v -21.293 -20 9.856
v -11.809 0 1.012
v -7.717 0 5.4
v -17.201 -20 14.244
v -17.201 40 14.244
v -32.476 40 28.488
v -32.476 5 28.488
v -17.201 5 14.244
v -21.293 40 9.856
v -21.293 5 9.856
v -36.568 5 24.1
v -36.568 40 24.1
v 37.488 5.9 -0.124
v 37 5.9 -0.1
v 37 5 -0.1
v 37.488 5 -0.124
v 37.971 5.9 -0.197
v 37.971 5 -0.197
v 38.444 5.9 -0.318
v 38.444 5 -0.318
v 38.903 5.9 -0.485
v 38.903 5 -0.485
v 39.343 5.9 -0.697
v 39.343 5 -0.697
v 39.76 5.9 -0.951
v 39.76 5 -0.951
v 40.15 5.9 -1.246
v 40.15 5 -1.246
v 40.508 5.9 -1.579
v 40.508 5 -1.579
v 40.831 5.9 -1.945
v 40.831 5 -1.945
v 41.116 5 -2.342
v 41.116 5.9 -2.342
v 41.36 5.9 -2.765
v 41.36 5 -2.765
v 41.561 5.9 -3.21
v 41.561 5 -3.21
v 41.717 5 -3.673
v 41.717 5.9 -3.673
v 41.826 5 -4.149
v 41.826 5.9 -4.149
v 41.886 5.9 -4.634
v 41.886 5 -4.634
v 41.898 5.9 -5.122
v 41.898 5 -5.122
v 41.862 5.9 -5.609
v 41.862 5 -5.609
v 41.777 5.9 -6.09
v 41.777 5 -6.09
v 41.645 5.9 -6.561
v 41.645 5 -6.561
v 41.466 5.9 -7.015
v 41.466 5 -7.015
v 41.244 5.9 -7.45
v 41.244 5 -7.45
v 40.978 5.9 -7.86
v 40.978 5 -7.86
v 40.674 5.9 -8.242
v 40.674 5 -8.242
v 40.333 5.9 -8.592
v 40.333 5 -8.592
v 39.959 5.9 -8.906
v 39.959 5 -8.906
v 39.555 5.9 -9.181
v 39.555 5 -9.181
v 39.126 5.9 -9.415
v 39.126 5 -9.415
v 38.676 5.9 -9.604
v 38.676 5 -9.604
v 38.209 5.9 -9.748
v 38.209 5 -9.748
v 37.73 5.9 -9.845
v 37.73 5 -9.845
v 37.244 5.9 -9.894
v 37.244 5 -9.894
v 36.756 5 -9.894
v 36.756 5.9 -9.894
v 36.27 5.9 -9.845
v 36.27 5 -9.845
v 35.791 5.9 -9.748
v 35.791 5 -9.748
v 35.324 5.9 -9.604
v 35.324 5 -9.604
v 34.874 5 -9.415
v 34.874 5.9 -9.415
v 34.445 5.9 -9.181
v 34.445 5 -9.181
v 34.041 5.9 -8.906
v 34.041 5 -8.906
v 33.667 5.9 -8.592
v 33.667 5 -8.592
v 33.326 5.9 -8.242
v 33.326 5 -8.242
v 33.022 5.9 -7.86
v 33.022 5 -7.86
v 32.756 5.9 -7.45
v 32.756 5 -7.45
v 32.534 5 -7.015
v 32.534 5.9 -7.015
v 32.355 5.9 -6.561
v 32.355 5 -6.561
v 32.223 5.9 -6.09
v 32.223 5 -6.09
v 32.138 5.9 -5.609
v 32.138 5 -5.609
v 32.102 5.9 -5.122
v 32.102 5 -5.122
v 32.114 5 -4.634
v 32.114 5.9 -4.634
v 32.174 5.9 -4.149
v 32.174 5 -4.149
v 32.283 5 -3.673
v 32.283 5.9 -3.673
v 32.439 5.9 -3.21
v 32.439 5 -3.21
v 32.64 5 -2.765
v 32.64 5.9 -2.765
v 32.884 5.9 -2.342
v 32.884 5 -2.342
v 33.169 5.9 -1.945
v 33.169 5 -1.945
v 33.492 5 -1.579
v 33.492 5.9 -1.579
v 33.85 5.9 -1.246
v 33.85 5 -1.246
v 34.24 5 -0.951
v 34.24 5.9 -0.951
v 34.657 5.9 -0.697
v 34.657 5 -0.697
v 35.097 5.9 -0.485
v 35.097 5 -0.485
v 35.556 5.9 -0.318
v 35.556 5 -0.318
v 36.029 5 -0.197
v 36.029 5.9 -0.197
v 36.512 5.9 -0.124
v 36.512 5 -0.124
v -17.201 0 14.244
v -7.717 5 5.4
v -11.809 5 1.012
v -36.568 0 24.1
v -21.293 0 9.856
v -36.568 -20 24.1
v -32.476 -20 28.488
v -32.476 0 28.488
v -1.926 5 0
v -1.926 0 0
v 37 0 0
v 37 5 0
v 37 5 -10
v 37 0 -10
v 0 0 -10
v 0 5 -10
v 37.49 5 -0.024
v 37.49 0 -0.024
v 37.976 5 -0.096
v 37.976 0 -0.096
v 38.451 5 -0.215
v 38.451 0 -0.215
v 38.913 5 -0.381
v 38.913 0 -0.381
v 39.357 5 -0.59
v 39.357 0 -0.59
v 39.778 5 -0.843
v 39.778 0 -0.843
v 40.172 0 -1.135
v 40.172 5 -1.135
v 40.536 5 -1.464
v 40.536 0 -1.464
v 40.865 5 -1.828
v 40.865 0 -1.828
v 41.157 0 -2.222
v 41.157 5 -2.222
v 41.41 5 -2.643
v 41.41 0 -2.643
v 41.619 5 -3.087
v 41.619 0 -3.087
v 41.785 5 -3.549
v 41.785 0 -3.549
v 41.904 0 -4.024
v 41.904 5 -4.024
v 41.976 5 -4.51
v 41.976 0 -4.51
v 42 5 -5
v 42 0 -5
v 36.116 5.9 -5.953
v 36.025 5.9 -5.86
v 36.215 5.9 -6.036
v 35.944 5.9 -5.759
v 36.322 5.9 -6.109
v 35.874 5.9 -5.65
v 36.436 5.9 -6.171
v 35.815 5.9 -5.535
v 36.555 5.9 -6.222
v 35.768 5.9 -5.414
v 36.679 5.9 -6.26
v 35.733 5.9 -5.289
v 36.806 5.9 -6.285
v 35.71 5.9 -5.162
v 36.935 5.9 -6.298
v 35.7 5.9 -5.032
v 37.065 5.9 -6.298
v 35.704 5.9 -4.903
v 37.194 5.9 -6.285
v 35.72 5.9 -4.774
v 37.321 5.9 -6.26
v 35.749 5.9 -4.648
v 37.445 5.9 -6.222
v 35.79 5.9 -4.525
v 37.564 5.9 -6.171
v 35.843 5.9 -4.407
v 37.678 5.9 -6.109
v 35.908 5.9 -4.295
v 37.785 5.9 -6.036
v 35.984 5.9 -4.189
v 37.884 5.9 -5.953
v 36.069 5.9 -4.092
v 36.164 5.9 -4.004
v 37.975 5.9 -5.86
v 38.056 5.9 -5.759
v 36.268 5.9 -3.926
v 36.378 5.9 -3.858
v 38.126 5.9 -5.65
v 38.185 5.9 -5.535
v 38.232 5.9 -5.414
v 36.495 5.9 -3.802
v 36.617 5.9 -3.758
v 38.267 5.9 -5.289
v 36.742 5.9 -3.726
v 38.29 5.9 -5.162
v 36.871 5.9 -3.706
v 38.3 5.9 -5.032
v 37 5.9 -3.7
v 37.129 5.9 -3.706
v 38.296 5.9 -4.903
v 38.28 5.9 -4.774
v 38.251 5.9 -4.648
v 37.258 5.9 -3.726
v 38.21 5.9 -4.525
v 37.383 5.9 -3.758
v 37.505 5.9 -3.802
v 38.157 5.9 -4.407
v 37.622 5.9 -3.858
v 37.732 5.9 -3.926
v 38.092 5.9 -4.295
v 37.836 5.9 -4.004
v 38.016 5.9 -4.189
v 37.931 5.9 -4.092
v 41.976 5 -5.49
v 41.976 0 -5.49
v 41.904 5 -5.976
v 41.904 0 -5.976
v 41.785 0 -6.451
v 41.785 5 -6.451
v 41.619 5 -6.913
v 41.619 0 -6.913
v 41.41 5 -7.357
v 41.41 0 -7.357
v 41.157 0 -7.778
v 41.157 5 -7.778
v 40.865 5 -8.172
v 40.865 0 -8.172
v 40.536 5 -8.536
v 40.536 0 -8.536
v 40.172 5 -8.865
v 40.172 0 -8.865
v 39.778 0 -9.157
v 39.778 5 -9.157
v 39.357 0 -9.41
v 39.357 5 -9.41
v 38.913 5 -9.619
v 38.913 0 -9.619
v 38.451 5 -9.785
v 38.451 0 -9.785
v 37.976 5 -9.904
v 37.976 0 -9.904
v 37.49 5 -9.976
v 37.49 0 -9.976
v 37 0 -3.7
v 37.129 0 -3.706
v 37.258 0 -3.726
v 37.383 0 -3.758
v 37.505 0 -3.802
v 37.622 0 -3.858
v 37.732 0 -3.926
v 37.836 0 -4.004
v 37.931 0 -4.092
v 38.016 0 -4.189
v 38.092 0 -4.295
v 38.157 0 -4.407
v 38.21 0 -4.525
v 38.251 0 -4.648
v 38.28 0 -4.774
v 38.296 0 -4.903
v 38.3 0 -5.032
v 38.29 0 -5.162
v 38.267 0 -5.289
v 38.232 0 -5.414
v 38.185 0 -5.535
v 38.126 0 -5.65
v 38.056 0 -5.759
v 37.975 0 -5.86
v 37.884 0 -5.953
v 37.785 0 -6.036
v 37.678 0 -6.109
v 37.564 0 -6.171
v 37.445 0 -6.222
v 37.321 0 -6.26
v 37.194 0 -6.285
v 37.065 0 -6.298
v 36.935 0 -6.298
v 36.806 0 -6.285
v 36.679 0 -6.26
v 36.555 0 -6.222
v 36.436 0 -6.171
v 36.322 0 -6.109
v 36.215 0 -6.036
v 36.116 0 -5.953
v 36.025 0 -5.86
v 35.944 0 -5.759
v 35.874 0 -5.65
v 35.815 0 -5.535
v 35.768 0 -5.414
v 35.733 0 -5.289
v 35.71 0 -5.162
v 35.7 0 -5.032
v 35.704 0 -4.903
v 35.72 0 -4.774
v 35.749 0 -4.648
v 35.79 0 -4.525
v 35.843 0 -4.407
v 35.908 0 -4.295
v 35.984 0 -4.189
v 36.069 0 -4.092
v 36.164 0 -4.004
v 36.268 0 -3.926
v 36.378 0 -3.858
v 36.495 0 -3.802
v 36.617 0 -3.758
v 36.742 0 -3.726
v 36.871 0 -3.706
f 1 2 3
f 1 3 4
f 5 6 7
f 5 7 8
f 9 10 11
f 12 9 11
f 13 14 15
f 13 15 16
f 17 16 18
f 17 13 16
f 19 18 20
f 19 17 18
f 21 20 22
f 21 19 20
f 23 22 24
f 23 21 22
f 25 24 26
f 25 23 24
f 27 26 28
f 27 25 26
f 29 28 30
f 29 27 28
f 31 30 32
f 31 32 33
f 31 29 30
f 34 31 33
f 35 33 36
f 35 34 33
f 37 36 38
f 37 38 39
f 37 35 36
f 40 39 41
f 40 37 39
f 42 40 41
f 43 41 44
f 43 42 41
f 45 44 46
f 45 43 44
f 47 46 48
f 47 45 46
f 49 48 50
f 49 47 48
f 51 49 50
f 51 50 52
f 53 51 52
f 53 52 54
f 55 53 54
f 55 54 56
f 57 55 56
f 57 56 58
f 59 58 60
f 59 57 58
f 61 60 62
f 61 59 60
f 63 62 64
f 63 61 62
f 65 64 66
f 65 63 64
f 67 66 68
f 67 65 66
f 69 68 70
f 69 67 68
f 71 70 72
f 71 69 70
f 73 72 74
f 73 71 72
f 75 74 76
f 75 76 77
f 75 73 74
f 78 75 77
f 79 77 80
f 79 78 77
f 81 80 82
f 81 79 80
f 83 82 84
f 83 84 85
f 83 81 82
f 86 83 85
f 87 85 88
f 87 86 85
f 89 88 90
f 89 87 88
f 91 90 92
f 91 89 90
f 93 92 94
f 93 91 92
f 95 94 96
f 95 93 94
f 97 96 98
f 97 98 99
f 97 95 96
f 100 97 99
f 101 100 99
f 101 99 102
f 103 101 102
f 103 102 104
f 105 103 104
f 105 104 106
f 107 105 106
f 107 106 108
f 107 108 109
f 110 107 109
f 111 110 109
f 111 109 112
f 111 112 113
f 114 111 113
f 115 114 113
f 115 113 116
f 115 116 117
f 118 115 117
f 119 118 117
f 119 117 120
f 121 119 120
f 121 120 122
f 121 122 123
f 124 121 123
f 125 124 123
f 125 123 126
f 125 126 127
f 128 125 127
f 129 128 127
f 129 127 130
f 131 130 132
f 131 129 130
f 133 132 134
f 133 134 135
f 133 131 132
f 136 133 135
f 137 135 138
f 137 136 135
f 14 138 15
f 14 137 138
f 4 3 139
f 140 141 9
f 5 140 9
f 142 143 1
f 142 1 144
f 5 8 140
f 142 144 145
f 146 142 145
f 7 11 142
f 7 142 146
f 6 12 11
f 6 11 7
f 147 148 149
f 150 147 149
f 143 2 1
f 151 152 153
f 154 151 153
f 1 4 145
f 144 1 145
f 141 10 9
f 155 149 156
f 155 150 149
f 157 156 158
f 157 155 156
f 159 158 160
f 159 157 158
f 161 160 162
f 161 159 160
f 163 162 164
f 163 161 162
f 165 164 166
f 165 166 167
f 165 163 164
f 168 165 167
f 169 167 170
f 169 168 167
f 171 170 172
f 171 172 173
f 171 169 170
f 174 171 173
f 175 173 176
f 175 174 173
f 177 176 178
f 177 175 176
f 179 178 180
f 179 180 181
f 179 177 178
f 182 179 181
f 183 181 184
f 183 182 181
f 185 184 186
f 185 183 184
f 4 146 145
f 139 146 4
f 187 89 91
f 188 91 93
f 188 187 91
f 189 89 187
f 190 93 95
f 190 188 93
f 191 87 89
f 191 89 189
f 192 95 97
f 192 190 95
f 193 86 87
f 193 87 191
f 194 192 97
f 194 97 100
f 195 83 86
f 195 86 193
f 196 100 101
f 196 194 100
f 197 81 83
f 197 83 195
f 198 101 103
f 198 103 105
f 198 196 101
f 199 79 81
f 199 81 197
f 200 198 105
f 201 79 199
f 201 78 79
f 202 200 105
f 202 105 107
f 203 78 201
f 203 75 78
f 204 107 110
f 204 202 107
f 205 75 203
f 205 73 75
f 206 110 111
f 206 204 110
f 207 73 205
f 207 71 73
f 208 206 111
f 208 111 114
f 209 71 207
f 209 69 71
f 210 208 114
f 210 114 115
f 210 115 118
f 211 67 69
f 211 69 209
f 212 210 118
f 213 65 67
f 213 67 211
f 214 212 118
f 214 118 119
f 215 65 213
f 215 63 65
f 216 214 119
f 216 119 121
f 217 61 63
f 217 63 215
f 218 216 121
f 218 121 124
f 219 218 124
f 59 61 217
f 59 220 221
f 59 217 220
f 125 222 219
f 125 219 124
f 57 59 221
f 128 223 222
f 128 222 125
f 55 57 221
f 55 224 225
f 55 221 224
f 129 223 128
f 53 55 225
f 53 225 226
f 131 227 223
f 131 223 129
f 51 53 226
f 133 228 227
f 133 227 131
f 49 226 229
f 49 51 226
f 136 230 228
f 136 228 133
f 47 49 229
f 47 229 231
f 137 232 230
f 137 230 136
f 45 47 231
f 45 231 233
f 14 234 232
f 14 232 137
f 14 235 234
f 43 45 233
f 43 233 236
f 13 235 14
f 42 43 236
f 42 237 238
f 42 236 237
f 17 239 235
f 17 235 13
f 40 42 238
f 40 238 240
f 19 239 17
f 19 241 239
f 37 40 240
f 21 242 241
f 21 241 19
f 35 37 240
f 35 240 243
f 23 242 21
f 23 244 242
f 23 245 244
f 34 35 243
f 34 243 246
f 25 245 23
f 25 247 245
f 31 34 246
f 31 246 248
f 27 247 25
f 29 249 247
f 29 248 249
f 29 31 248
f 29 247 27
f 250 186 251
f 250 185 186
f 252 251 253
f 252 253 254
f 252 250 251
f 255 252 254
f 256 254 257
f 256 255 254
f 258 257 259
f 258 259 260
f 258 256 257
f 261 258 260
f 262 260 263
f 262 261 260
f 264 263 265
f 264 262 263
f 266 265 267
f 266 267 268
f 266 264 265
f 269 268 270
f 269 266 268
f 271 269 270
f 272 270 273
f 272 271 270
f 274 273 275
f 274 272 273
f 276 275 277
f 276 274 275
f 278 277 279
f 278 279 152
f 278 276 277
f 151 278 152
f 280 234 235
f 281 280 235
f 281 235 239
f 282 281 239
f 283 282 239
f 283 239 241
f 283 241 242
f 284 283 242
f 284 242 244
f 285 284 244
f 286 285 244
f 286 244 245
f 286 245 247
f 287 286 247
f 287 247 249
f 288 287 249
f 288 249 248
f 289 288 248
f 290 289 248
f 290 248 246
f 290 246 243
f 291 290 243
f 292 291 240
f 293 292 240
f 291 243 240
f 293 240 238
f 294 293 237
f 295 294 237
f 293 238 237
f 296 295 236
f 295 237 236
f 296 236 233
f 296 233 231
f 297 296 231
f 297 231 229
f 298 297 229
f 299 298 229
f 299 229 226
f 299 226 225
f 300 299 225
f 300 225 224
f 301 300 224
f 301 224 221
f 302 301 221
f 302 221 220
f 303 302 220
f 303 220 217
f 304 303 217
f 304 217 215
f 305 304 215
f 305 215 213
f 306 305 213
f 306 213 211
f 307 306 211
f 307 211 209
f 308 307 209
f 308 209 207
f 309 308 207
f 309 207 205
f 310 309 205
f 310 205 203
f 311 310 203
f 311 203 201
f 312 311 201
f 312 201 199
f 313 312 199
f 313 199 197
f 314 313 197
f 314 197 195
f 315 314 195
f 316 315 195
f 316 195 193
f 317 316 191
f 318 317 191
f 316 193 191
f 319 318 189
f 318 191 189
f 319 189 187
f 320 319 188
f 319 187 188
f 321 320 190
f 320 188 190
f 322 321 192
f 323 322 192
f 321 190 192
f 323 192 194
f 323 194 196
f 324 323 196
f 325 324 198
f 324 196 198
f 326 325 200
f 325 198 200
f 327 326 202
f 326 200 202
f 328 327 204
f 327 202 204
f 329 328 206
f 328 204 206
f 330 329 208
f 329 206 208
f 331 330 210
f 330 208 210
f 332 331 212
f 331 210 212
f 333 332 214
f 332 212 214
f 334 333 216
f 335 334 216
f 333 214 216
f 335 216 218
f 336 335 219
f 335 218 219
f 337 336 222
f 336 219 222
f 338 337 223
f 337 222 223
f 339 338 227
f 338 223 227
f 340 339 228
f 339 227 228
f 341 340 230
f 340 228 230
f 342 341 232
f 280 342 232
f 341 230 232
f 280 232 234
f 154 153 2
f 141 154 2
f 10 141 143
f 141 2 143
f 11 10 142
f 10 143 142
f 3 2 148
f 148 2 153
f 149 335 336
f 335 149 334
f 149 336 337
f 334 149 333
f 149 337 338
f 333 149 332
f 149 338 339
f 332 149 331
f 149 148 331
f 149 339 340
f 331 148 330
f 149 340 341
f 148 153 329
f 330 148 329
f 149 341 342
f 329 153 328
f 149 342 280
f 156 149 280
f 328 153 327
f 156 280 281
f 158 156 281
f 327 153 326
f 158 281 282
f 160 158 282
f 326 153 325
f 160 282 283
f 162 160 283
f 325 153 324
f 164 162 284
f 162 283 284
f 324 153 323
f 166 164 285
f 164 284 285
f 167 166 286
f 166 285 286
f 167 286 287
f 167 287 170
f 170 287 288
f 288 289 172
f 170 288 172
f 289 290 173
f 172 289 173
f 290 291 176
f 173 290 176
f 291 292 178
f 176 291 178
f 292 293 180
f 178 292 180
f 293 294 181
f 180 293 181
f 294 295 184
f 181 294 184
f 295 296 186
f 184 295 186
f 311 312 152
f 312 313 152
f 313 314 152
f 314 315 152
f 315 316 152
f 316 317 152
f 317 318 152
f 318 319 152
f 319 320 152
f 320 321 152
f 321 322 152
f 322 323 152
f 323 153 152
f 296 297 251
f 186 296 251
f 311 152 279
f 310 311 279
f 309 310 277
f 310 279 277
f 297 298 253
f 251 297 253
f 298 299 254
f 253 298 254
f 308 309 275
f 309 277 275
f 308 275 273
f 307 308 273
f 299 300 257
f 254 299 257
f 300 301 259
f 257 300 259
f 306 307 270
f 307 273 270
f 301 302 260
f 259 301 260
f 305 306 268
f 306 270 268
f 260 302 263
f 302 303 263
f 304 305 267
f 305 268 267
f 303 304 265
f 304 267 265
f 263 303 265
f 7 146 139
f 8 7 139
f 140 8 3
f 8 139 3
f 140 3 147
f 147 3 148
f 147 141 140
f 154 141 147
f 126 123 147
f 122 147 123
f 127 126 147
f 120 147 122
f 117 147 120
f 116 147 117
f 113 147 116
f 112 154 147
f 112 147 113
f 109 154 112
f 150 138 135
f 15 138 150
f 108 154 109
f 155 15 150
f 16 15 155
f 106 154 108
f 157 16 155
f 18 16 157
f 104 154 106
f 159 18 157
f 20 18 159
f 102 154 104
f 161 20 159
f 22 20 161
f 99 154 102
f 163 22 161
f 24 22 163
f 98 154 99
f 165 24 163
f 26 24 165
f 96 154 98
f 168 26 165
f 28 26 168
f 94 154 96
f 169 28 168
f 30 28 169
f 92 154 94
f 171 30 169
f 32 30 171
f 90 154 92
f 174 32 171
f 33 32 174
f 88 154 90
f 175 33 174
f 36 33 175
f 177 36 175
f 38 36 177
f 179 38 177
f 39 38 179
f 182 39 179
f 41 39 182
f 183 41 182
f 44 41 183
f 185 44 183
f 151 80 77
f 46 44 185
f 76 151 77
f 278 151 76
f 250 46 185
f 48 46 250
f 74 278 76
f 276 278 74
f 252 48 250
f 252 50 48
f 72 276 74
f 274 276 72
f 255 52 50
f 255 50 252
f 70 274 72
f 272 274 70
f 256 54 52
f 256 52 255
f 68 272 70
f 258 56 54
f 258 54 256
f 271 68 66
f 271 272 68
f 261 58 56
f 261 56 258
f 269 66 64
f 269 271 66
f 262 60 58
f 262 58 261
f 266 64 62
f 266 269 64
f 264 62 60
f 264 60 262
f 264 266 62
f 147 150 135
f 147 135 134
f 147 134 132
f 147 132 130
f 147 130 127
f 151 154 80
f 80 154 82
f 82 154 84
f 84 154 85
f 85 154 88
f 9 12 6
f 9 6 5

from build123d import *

# Parameters (mm, degrees)
BOSS_EXTRUDE1_DEPTH = 5
FILLET1_R           = 5
SKETCH2_R           = 1.3
CUT_EXTRUDE1_DEPTH  = 10
BOSS_EXTRUDE2_DEPTH = 35
BOSS_EXTRUDE3_DEPTH = 20
BOSS_EXTRUDE4_DEPTH = 6
BOSS_EXTRUDE5_START = 0.9
SKETCH6_R           = 4.9
SKETCH6_R_2         = 1.3
BOSS_EXTRUDE5_DEPTH = 0.9


with BuildPart() as part:
    # Sketch1 → Boss-Extrude1 (new body)
    with BuildSketch(Plane(origin=(0, 0, 0), x_dir=(1, 0, 0), z_dir=(0, 1, 0))):
        Polygon((4.09199016, 5.61187779), (0, 10), (0, 1.796035233), align=None)
        Polygon((0, 1.796035233), (0, 10), (-36.567685081, -24.099918003), (-32.475694921, -28.488040213), (-1.926011986, 0), align=None)
        Polygon((42, 10), (0, 10), (4.09199016, 5.61187779), (0, 1.796035233), (0, 0), (42, 0), align=None)
        Polygon((0, 0), (0, 1.796035233), (-1.926011986, 0), align=None)
    extrude(amount=BOSS_EXTRUDE1_DEPTH)

    # Fillet1
    fillet1_edges = [part.edges().sort_by_distance(p)[0] for p in [
        (42, 2.5, 0),
        (42, 2.5, -10),
    ]]
    fillet(fillet1_edges, radius=FILLET1_R - 0.0001)  # a hair under: the kernel refuses the full size

    # Sketch2 → Cut-Extrude1 (cut)
    with BuildSketch(Plane(origin=(0, 5, 0), x_dir=(1, 0, 0), z_dir=(0, 1, 0))):
        with Locations(Location((37, 5, 0), (0, 0, 270))):
            Circle(SKETCH2_R)
    extrude(amount=-CUT_EXTRUDE1_DEPTH, mode=Mode.SUBTRACT)

    # Sketch3 → Boss-Extrude2 (add)
    with BuildSketch(Plane(origin=(0, 5, 0), x_dir=(1, 0, 0), z_dir=(0, 1, 0))):
        Polygon((-36.567685081, -24.099918003), (-32.475694921, -28.488040213), (-17.200853453, -14.244020106), (-21.292843614, -9.855897897), align=None)
    extrude(amount=BOSS_EXTRUDE2_DEPTH)

    # Sketch4 → Boss-Extrude3 (add)
    with BuildSketch(Plane.XZ):
        Polygon((-36.567685081, 24.099918003), (-32.475694921, 28.488040213), (-17.200853453, 14.244020106), (-21.292843614, 9.855897897), align=None)
    extrude(amount=BOSS_EXTRUDE3_DEPTH)

    # Sketch5 → Boss-Extrude4 (add)
    with BuildSketch(Plane(origin=(-4.987820251, 0, -5.348782369), x_dir=(-0.7313537016191739, 0, 0.6819983600624947), z_dir=(-0.6819983600624948, 0, -0.731353701619174))):
        Polygon((22.294306197, -20), (22.294306197, 0), (9.326364945, 0), align=None)
        Polygon((9.326364945, 5), (22.294306197, 40), (22.294306197, 5), align=None)
    extrude(amount=-BOSS_EXTRUDE4_DEPTH)

    # Sketch6 → Boss-Extrude5 (add)
    with BuildSketch(Plane(origin=(0, 5, 0), x_dir=(1, 0, 0), z_dir=(0, 1, 0)).offset(BOSS_EXTRUDE5_START)):
        with Locations(Location((37, 5, 0), (0, 0, 270))):
            Circle(SKETCH6_R)
        with Locations(Location((37, 5, 0), (0, 0, 270))):
            Circle(SKETCH6_R_2, mode=Mode.SUBTRACT)
    extrude(amount=-BOSS_EXTRUDE5_DEPTH)


solid = part.part
